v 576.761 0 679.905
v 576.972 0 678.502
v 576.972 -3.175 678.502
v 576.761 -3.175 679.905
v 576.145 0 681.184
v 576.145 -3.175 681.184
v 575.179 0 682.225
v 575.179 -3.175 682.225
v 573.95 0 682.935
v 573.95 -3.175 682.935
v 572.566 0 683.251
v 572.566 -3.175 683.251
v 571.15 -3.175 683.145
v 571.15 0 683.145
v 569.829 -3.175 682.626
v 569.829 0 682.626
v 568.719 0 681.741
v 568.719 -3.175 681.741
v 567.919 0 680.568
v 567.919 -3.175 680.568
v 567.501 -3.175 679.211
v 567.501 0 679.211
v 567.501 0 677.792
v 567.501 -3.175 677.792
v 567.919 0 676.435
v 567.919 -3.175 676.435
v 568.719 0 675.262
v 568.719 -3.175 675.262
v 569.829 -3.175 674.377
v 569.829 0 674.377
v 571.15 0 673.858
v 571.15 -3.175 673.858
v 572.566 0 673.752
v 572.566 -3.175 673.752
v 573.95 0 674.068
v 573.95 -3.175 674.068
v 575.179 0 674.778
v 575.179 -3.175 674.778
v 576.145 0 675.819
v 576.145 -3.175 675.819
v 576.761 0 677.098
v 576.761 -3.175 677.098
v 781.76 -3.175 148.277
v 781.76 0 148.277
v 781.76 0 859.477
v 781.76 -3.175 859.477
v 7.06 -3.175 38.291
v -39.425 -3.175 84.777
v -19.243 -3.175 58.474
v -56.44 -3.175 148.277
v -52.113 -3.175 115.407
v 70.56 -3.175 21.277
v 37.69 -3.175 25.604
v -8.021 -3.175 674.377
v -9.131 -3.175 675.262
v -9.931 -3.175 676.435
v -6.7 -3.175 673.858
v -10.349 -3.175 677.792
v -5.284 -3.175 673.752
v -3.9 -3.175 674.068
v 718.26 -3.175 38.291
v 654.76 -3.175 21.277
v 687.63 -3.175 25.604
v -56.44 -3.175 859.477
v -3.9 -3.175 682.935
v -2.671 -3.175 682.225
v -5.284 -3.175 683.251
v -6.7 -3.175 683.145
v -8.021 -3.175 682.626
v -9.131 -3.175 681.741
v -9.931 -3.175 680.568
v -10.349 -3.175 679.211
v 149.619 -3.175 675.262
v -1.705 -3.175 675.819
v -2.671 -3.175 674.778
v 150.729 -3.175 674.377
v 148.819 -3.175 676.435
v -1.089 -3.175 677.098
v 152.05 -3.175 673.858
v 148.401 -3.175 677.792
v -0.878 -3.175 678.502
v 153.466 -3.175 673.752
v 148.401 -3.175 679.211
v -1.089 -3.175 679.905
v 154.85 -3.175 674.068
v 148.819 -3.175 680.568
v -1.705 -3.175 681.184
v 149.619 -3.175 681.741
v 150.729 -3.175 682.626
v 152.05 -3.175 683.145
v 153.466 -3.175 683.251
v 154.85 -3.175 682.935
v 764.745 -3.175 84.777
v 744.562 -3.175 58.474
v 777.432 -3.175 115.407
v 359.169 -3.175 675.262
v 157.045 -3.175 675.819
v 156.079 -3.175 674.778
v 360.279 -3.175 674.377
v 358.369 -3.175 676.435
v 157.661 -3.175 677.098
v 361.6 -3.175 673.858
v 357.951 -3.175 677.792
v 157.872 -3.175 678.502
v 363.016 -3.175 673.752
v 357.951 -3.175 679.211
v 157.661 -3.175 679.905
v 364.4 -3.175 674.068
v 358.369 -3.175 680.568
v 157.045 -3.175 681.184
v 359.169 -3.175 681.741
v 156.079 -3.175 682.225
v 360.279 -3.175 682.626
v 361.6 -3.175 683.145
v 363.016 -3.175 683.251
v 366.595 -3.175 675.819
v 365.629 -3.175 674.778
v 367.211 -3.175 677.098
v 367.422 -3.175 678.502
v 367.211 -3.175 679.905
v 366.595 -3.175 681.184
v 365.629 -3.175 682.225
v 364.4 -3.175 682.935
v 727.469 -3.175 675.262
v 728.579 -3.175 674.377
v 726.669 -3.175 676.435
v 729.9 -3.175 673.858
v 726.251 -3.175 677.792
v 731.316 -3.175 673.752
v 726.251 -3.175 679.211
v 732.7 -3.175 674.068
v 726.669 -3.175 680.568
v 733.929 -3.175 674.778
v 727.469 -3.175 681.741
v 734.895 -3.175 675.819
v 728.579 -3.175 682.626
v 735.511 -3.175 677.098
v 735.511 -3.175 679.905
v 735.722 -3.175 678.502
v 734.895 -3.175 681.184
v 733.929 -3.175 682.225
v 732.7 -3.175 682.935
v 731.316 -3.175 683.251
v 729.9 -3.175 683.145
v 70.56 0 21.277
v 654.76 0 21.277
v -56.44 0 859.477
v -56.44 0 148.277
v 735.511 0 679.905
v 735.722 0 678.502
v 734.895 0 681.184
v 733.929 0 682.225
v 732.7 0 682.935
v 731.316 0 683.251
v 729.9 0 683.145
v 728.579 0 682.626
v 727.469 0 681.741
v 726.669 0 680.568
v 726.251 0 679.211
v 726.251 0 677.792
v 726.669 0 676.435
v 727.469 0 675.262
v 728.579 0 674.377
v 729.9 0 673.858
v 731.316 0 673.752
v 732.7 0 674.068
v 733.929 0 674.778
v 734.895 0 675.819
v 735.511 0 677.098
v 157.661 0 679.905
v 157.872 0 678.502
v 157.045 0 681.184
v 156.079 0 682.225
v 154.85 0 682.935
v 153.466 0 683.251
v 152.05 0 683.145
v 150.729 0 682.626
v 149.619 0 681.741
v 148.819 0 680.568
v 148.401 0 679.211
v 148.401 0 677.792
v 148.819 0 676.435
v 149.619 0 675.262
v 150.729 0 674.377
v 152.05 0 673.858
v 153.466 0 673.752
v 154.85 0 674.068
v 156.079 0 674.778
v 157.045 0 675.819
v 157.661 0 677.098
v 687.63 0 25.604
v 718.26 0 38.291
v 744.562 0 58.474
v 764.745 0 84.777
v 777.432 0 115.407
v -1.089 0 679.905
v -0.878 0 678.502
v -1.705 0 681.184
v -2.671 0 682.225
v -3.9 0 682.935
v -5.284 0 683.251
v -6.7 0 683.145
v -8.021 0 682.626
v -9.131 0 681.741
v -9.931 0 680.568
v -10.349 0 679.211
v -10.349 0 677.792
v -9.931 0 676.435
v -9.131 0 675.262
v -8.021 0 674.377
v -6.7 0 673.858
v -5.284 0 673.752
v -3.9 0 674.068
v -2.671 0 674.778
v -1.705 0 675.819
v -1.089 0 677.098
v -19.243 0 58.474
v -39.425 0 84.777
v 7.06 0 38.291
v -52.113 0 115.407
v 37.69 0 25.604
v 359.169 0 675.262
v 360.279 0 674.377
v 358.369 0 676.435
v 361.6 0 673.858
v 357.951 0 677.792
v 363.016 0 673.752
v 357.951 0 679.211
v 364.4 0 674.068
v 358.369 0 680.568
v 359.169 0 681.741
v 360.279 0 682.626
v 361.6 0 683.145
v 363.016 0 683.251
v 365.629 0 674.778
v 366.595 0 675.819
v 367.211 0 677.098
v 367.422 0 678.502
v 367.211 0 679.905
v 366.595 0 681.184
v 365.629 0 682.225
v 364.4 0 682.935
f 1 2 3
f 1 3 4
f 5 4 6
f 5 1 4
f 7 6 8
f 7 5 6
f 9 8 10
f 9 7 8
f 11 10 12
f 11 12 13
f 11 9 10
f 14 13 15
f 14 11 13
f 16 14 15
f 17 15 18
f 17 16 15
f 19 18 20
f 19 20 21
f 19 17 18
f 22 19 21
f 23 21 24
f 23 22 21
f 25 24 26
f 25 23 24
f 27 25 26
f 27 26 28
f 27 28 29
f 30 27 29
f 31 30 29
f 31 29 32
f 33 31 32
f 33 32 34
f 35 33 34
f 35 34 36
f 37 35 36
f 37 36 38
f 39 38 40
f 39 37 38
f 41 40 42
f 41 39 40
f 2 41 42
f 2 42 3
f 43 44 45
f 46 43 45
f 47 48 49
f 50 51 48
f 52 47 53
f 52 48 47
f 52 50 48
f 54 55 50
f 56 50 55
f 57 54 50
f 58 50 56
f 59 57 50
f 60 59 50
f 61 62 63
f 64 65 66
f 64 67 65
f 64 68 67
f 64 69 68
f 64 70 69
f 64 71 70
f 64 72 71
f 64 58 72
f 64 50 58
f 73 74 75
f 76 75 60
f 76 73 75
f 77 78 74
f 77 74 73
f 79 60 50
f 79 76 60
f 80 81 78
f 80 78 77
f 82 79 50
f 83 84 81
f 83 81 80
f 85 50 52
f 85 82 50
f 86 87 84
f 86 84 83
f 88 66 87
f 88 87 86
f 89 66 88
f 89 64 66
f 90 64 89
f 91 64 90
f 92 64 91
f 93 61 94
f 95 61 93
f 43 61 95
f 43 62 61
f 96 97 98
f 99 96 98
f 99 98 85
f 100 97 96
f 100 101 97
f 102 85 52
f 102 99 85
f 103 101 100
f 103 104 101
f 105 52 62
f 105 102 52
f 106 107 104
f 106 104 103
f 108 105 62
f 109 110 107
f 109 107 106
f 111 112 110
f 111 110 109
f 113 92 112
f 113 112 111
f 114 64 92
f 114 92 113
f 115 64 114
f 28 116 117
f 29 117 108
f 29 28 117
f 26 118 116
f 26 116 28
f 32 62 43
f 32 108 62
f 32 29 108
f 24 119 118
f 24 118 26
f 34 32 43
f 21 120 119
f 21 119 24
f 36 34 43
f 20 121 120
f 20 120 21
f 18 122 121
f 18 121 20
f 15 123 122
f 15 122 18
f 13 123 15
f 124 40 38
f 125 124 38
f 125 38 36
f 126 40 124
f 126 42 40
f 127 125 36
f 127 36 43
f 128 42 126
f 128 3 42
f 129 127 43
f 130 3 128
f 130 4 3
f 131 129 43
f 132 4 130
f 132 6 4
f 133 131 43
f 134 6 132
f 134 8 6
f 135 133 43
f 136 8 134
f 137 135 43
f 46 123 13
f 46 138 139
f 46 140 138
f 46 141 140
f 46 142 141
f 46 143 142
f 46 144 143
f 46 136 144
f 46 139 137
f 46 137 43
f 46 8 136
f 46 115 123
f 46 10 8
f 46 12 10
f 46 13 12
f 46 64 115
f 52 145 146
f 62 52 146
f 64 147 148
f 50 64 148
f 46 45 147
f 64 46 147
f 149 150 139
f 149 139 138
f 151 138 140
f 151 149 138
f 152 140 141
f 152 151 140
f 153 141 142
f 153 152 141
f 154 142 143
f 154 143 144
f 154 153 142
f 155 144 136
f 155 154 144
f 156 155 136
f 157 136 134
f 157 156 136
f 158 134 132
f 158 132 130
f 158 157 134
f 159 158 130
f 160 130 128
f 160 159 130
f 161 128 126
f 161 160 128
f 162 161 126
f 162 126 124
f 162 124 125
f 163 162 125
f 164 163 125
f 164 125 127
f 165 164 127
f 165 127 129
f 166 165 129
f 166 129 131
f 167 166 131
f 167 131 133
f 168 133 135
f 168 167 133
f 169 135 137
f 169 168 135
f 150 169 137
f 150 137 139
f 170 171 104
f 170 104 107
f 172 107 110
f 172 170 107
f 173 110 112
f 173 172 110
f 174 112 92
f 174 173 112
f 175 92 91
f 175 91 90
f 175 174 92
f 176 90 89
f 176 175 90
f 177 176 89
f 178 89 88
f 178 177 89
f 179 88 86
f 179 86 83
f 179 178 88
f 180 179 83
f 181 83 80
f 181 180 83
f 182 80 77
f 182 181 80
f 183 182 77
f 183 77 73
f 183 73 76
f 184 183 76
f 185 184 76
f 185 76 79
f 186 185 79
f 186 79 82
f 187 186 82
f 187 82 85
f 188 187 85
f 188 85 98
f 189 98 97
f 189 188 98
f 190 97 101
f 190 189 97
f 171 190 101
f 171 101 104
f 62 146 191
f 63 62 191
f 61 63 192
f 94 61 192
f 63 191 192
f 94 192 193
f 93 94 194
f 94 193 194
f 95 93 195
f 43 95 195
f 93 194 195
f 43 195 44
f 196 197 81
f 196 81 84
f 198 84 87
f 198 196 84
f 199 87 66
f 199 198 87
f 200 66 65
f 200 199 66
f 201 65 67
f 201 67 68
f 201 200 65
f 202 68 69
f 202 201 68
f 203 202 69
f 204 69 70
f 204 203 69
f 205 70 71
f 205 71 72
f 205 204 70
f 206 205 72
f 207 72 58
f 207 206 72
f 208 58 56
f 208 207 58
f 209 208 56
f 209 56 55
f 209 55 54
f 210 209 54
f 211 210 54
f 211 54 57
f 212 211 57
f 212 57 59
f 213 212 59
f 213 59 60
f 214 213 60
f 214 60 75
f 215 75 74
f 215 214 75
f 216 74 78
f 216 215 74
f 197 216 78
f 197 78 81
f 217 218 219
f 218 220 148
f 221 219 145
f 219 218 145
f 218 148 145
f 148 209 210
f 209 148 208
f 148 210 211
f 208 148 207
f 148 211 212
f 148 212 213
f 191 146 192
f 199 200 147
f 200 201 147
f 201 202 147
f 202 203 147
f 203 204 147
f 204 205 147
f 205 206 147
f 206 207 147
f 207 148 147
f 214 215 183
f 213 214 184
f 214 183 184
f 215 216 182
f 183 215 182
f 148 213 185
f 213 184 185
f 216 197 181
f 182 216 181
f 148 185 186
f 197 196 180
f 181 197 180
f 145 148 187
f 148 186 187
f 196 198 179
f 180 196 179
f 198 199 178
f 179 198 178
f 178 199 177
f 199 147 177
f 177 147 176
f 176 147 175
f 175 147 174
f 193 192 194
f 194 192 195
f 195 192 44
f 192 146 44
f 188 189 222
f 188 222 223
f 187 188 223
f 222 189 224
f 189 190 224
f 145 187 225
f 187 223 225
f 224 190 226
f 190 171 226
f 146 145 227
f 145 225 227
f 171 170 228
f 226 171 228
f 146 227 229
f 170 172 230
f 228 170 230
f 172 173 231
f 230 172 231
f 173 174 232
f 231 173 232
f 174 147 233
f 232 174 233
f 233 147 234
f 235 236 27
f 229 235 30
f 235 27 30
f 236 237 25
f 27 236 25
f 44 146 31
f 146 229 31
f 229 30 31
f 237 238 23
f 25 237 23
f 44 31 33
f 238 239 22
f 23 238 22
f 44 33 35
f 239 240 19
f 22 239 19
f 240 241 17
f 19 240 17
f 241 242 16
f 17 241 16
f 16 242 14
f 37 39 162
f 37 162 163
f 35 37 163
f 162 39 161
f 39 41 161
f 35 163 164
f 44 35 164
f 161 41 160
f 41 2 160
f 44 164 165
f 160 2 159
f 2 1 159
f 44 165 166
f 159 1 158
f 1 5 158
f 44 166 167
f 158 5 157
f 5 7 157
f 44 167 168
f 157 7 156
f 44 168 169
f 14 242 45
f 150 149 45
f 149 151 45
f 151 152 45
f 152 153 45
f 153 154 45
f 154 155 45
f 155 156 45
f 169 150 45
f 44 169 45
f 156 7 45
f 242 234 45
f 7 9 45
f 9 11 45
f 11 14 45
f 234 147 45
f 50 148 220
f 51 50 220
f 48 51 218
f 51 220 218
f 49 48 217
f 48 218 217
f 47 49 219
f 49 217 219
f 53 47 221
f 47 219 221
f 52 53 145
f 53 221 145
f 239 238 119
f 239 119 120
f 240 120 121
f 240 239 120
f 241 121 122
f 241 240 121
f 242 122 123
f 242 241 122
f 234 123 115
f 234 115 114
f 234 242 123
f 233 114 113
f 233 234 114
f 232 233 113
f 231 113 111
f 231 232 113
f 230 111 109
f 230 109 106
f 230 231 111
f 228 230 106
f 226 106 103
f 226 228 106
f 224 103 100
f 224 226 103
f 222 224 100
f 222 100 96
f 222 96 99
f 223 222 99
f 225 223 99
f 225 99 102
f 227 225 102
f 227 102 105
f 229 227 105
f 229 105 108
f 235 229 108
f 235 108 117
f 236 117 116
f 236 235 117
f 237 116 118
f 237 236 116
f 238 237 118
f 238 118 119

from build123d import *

# Parameters (mm, degrees)
F0_R     = 4.7625
F1_DEPTH = 3.175


with BuildPart() as f1:
    # F0 (on Front) → F1 (new body)
    with BuildSketch(Plane.XZ):
        with BuildLine():
            Line((781.759825, 859.476545), (-56.440175, 859.476545))
            Line((-56.440175, 859.476545), (-56.440175, 148.276545))
            ThreePointArc((-56.440175, 148.276545), (-19.242736, 58.473984), (70.559825, 21.276545))
            Line((70.559825, 21.276545), (654.759825, 21.276545))
            ThreePointArc((654.759825, 21.276545), (744.562387, 58.473984), (781.759825, 148.276545))
            Line((781.759825, 148.276545), (781.759825, 859.476545))
        make_face()
        with Locations((-5.640175, 678.501545)):
            Circle(F0_R, mode=Mode.SUBTRACT)
        with Locations((153.109825, 678.501545)):
            Circle(F0_R, mode=Mode.SUBTRACT)
        with Locations((362.659825, 678.501545)):
            Circle(F0_R, mode=Mode.SUBTRACT)
        with Locations((572.209825, 678.501545)):
            Circle(F0_R, mode=Mode.SUBTRACT)
        with Locations((730.959825, 678.501545)):
            Circle(F0_R, mode=Mode.SUBTRACT)
    extrude(amount=F1_DEPTH)


solid = f1.part
